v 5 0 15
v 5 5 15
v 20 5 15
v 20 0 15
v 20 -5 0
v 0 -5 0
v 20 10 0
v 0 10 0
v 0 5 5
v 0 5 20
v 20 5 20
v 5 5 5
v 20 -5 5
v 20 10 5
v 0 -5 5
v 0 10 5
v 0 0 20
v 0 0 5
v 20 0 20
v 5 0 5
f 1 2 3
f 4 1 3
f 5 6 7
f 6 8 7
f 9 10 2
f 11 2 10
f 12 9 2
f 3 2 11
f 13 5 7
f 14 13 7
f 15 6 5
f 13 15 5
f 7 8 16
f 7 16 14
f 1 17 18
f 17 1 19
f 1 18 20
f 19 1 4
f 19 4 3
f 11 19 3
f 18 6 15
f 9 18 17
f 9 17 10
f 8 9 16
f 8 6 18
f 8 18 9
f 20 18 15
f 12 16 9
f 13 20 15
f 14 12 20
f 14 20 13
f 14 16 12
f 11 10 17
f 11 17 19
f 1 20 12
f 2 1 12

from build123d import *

# Parameters (mm, degrees)
BOX001_W     = 5
BOX001_H     = 5
BOX001_DEPTH = 20
BOX002_W     = 20
BOX002_H     = 5
BOX002_DEPTH = 5
BOX_W        = 20
BOX_H        = 15
BOX_DEPTH    = 5


with BuildPart() as cube001:
    # Box001 → Box001 (new body)
    with BuildSketch(Plane.XY):
        with Locations((2.5, 2.5)):
            Rectangle(BOX001_W, BOX001_H)
    extrude(amount=BOX001_DEPTH)


with BuildPart() as cube002:
    # Box002 → Box002 (new body)
    with BuildSketch(Plane.XY.offset(15)):
        with Locations((10, 2.5)):
            Rectangle(BOX002_W, BOX002_H)
    extrude(amount=BOX002_DEPTH)


with BuildPart() as fusion:
    # Box → Box (new body)
    with BuildSketch(Plane(origin=(0, -5, 0), x_dir=(1, 0, 0), z_dir=(0, 0, 1))):
        with Locations((10, 7.5)):
            Rectangle(BOX_W, BOX_H)
    extrude(amount=BOX_DEPTH)

    # Fusion: union Cube001, Cube002
    add(cube001.part)
    add(cube002.part)


solid = fusion.part
